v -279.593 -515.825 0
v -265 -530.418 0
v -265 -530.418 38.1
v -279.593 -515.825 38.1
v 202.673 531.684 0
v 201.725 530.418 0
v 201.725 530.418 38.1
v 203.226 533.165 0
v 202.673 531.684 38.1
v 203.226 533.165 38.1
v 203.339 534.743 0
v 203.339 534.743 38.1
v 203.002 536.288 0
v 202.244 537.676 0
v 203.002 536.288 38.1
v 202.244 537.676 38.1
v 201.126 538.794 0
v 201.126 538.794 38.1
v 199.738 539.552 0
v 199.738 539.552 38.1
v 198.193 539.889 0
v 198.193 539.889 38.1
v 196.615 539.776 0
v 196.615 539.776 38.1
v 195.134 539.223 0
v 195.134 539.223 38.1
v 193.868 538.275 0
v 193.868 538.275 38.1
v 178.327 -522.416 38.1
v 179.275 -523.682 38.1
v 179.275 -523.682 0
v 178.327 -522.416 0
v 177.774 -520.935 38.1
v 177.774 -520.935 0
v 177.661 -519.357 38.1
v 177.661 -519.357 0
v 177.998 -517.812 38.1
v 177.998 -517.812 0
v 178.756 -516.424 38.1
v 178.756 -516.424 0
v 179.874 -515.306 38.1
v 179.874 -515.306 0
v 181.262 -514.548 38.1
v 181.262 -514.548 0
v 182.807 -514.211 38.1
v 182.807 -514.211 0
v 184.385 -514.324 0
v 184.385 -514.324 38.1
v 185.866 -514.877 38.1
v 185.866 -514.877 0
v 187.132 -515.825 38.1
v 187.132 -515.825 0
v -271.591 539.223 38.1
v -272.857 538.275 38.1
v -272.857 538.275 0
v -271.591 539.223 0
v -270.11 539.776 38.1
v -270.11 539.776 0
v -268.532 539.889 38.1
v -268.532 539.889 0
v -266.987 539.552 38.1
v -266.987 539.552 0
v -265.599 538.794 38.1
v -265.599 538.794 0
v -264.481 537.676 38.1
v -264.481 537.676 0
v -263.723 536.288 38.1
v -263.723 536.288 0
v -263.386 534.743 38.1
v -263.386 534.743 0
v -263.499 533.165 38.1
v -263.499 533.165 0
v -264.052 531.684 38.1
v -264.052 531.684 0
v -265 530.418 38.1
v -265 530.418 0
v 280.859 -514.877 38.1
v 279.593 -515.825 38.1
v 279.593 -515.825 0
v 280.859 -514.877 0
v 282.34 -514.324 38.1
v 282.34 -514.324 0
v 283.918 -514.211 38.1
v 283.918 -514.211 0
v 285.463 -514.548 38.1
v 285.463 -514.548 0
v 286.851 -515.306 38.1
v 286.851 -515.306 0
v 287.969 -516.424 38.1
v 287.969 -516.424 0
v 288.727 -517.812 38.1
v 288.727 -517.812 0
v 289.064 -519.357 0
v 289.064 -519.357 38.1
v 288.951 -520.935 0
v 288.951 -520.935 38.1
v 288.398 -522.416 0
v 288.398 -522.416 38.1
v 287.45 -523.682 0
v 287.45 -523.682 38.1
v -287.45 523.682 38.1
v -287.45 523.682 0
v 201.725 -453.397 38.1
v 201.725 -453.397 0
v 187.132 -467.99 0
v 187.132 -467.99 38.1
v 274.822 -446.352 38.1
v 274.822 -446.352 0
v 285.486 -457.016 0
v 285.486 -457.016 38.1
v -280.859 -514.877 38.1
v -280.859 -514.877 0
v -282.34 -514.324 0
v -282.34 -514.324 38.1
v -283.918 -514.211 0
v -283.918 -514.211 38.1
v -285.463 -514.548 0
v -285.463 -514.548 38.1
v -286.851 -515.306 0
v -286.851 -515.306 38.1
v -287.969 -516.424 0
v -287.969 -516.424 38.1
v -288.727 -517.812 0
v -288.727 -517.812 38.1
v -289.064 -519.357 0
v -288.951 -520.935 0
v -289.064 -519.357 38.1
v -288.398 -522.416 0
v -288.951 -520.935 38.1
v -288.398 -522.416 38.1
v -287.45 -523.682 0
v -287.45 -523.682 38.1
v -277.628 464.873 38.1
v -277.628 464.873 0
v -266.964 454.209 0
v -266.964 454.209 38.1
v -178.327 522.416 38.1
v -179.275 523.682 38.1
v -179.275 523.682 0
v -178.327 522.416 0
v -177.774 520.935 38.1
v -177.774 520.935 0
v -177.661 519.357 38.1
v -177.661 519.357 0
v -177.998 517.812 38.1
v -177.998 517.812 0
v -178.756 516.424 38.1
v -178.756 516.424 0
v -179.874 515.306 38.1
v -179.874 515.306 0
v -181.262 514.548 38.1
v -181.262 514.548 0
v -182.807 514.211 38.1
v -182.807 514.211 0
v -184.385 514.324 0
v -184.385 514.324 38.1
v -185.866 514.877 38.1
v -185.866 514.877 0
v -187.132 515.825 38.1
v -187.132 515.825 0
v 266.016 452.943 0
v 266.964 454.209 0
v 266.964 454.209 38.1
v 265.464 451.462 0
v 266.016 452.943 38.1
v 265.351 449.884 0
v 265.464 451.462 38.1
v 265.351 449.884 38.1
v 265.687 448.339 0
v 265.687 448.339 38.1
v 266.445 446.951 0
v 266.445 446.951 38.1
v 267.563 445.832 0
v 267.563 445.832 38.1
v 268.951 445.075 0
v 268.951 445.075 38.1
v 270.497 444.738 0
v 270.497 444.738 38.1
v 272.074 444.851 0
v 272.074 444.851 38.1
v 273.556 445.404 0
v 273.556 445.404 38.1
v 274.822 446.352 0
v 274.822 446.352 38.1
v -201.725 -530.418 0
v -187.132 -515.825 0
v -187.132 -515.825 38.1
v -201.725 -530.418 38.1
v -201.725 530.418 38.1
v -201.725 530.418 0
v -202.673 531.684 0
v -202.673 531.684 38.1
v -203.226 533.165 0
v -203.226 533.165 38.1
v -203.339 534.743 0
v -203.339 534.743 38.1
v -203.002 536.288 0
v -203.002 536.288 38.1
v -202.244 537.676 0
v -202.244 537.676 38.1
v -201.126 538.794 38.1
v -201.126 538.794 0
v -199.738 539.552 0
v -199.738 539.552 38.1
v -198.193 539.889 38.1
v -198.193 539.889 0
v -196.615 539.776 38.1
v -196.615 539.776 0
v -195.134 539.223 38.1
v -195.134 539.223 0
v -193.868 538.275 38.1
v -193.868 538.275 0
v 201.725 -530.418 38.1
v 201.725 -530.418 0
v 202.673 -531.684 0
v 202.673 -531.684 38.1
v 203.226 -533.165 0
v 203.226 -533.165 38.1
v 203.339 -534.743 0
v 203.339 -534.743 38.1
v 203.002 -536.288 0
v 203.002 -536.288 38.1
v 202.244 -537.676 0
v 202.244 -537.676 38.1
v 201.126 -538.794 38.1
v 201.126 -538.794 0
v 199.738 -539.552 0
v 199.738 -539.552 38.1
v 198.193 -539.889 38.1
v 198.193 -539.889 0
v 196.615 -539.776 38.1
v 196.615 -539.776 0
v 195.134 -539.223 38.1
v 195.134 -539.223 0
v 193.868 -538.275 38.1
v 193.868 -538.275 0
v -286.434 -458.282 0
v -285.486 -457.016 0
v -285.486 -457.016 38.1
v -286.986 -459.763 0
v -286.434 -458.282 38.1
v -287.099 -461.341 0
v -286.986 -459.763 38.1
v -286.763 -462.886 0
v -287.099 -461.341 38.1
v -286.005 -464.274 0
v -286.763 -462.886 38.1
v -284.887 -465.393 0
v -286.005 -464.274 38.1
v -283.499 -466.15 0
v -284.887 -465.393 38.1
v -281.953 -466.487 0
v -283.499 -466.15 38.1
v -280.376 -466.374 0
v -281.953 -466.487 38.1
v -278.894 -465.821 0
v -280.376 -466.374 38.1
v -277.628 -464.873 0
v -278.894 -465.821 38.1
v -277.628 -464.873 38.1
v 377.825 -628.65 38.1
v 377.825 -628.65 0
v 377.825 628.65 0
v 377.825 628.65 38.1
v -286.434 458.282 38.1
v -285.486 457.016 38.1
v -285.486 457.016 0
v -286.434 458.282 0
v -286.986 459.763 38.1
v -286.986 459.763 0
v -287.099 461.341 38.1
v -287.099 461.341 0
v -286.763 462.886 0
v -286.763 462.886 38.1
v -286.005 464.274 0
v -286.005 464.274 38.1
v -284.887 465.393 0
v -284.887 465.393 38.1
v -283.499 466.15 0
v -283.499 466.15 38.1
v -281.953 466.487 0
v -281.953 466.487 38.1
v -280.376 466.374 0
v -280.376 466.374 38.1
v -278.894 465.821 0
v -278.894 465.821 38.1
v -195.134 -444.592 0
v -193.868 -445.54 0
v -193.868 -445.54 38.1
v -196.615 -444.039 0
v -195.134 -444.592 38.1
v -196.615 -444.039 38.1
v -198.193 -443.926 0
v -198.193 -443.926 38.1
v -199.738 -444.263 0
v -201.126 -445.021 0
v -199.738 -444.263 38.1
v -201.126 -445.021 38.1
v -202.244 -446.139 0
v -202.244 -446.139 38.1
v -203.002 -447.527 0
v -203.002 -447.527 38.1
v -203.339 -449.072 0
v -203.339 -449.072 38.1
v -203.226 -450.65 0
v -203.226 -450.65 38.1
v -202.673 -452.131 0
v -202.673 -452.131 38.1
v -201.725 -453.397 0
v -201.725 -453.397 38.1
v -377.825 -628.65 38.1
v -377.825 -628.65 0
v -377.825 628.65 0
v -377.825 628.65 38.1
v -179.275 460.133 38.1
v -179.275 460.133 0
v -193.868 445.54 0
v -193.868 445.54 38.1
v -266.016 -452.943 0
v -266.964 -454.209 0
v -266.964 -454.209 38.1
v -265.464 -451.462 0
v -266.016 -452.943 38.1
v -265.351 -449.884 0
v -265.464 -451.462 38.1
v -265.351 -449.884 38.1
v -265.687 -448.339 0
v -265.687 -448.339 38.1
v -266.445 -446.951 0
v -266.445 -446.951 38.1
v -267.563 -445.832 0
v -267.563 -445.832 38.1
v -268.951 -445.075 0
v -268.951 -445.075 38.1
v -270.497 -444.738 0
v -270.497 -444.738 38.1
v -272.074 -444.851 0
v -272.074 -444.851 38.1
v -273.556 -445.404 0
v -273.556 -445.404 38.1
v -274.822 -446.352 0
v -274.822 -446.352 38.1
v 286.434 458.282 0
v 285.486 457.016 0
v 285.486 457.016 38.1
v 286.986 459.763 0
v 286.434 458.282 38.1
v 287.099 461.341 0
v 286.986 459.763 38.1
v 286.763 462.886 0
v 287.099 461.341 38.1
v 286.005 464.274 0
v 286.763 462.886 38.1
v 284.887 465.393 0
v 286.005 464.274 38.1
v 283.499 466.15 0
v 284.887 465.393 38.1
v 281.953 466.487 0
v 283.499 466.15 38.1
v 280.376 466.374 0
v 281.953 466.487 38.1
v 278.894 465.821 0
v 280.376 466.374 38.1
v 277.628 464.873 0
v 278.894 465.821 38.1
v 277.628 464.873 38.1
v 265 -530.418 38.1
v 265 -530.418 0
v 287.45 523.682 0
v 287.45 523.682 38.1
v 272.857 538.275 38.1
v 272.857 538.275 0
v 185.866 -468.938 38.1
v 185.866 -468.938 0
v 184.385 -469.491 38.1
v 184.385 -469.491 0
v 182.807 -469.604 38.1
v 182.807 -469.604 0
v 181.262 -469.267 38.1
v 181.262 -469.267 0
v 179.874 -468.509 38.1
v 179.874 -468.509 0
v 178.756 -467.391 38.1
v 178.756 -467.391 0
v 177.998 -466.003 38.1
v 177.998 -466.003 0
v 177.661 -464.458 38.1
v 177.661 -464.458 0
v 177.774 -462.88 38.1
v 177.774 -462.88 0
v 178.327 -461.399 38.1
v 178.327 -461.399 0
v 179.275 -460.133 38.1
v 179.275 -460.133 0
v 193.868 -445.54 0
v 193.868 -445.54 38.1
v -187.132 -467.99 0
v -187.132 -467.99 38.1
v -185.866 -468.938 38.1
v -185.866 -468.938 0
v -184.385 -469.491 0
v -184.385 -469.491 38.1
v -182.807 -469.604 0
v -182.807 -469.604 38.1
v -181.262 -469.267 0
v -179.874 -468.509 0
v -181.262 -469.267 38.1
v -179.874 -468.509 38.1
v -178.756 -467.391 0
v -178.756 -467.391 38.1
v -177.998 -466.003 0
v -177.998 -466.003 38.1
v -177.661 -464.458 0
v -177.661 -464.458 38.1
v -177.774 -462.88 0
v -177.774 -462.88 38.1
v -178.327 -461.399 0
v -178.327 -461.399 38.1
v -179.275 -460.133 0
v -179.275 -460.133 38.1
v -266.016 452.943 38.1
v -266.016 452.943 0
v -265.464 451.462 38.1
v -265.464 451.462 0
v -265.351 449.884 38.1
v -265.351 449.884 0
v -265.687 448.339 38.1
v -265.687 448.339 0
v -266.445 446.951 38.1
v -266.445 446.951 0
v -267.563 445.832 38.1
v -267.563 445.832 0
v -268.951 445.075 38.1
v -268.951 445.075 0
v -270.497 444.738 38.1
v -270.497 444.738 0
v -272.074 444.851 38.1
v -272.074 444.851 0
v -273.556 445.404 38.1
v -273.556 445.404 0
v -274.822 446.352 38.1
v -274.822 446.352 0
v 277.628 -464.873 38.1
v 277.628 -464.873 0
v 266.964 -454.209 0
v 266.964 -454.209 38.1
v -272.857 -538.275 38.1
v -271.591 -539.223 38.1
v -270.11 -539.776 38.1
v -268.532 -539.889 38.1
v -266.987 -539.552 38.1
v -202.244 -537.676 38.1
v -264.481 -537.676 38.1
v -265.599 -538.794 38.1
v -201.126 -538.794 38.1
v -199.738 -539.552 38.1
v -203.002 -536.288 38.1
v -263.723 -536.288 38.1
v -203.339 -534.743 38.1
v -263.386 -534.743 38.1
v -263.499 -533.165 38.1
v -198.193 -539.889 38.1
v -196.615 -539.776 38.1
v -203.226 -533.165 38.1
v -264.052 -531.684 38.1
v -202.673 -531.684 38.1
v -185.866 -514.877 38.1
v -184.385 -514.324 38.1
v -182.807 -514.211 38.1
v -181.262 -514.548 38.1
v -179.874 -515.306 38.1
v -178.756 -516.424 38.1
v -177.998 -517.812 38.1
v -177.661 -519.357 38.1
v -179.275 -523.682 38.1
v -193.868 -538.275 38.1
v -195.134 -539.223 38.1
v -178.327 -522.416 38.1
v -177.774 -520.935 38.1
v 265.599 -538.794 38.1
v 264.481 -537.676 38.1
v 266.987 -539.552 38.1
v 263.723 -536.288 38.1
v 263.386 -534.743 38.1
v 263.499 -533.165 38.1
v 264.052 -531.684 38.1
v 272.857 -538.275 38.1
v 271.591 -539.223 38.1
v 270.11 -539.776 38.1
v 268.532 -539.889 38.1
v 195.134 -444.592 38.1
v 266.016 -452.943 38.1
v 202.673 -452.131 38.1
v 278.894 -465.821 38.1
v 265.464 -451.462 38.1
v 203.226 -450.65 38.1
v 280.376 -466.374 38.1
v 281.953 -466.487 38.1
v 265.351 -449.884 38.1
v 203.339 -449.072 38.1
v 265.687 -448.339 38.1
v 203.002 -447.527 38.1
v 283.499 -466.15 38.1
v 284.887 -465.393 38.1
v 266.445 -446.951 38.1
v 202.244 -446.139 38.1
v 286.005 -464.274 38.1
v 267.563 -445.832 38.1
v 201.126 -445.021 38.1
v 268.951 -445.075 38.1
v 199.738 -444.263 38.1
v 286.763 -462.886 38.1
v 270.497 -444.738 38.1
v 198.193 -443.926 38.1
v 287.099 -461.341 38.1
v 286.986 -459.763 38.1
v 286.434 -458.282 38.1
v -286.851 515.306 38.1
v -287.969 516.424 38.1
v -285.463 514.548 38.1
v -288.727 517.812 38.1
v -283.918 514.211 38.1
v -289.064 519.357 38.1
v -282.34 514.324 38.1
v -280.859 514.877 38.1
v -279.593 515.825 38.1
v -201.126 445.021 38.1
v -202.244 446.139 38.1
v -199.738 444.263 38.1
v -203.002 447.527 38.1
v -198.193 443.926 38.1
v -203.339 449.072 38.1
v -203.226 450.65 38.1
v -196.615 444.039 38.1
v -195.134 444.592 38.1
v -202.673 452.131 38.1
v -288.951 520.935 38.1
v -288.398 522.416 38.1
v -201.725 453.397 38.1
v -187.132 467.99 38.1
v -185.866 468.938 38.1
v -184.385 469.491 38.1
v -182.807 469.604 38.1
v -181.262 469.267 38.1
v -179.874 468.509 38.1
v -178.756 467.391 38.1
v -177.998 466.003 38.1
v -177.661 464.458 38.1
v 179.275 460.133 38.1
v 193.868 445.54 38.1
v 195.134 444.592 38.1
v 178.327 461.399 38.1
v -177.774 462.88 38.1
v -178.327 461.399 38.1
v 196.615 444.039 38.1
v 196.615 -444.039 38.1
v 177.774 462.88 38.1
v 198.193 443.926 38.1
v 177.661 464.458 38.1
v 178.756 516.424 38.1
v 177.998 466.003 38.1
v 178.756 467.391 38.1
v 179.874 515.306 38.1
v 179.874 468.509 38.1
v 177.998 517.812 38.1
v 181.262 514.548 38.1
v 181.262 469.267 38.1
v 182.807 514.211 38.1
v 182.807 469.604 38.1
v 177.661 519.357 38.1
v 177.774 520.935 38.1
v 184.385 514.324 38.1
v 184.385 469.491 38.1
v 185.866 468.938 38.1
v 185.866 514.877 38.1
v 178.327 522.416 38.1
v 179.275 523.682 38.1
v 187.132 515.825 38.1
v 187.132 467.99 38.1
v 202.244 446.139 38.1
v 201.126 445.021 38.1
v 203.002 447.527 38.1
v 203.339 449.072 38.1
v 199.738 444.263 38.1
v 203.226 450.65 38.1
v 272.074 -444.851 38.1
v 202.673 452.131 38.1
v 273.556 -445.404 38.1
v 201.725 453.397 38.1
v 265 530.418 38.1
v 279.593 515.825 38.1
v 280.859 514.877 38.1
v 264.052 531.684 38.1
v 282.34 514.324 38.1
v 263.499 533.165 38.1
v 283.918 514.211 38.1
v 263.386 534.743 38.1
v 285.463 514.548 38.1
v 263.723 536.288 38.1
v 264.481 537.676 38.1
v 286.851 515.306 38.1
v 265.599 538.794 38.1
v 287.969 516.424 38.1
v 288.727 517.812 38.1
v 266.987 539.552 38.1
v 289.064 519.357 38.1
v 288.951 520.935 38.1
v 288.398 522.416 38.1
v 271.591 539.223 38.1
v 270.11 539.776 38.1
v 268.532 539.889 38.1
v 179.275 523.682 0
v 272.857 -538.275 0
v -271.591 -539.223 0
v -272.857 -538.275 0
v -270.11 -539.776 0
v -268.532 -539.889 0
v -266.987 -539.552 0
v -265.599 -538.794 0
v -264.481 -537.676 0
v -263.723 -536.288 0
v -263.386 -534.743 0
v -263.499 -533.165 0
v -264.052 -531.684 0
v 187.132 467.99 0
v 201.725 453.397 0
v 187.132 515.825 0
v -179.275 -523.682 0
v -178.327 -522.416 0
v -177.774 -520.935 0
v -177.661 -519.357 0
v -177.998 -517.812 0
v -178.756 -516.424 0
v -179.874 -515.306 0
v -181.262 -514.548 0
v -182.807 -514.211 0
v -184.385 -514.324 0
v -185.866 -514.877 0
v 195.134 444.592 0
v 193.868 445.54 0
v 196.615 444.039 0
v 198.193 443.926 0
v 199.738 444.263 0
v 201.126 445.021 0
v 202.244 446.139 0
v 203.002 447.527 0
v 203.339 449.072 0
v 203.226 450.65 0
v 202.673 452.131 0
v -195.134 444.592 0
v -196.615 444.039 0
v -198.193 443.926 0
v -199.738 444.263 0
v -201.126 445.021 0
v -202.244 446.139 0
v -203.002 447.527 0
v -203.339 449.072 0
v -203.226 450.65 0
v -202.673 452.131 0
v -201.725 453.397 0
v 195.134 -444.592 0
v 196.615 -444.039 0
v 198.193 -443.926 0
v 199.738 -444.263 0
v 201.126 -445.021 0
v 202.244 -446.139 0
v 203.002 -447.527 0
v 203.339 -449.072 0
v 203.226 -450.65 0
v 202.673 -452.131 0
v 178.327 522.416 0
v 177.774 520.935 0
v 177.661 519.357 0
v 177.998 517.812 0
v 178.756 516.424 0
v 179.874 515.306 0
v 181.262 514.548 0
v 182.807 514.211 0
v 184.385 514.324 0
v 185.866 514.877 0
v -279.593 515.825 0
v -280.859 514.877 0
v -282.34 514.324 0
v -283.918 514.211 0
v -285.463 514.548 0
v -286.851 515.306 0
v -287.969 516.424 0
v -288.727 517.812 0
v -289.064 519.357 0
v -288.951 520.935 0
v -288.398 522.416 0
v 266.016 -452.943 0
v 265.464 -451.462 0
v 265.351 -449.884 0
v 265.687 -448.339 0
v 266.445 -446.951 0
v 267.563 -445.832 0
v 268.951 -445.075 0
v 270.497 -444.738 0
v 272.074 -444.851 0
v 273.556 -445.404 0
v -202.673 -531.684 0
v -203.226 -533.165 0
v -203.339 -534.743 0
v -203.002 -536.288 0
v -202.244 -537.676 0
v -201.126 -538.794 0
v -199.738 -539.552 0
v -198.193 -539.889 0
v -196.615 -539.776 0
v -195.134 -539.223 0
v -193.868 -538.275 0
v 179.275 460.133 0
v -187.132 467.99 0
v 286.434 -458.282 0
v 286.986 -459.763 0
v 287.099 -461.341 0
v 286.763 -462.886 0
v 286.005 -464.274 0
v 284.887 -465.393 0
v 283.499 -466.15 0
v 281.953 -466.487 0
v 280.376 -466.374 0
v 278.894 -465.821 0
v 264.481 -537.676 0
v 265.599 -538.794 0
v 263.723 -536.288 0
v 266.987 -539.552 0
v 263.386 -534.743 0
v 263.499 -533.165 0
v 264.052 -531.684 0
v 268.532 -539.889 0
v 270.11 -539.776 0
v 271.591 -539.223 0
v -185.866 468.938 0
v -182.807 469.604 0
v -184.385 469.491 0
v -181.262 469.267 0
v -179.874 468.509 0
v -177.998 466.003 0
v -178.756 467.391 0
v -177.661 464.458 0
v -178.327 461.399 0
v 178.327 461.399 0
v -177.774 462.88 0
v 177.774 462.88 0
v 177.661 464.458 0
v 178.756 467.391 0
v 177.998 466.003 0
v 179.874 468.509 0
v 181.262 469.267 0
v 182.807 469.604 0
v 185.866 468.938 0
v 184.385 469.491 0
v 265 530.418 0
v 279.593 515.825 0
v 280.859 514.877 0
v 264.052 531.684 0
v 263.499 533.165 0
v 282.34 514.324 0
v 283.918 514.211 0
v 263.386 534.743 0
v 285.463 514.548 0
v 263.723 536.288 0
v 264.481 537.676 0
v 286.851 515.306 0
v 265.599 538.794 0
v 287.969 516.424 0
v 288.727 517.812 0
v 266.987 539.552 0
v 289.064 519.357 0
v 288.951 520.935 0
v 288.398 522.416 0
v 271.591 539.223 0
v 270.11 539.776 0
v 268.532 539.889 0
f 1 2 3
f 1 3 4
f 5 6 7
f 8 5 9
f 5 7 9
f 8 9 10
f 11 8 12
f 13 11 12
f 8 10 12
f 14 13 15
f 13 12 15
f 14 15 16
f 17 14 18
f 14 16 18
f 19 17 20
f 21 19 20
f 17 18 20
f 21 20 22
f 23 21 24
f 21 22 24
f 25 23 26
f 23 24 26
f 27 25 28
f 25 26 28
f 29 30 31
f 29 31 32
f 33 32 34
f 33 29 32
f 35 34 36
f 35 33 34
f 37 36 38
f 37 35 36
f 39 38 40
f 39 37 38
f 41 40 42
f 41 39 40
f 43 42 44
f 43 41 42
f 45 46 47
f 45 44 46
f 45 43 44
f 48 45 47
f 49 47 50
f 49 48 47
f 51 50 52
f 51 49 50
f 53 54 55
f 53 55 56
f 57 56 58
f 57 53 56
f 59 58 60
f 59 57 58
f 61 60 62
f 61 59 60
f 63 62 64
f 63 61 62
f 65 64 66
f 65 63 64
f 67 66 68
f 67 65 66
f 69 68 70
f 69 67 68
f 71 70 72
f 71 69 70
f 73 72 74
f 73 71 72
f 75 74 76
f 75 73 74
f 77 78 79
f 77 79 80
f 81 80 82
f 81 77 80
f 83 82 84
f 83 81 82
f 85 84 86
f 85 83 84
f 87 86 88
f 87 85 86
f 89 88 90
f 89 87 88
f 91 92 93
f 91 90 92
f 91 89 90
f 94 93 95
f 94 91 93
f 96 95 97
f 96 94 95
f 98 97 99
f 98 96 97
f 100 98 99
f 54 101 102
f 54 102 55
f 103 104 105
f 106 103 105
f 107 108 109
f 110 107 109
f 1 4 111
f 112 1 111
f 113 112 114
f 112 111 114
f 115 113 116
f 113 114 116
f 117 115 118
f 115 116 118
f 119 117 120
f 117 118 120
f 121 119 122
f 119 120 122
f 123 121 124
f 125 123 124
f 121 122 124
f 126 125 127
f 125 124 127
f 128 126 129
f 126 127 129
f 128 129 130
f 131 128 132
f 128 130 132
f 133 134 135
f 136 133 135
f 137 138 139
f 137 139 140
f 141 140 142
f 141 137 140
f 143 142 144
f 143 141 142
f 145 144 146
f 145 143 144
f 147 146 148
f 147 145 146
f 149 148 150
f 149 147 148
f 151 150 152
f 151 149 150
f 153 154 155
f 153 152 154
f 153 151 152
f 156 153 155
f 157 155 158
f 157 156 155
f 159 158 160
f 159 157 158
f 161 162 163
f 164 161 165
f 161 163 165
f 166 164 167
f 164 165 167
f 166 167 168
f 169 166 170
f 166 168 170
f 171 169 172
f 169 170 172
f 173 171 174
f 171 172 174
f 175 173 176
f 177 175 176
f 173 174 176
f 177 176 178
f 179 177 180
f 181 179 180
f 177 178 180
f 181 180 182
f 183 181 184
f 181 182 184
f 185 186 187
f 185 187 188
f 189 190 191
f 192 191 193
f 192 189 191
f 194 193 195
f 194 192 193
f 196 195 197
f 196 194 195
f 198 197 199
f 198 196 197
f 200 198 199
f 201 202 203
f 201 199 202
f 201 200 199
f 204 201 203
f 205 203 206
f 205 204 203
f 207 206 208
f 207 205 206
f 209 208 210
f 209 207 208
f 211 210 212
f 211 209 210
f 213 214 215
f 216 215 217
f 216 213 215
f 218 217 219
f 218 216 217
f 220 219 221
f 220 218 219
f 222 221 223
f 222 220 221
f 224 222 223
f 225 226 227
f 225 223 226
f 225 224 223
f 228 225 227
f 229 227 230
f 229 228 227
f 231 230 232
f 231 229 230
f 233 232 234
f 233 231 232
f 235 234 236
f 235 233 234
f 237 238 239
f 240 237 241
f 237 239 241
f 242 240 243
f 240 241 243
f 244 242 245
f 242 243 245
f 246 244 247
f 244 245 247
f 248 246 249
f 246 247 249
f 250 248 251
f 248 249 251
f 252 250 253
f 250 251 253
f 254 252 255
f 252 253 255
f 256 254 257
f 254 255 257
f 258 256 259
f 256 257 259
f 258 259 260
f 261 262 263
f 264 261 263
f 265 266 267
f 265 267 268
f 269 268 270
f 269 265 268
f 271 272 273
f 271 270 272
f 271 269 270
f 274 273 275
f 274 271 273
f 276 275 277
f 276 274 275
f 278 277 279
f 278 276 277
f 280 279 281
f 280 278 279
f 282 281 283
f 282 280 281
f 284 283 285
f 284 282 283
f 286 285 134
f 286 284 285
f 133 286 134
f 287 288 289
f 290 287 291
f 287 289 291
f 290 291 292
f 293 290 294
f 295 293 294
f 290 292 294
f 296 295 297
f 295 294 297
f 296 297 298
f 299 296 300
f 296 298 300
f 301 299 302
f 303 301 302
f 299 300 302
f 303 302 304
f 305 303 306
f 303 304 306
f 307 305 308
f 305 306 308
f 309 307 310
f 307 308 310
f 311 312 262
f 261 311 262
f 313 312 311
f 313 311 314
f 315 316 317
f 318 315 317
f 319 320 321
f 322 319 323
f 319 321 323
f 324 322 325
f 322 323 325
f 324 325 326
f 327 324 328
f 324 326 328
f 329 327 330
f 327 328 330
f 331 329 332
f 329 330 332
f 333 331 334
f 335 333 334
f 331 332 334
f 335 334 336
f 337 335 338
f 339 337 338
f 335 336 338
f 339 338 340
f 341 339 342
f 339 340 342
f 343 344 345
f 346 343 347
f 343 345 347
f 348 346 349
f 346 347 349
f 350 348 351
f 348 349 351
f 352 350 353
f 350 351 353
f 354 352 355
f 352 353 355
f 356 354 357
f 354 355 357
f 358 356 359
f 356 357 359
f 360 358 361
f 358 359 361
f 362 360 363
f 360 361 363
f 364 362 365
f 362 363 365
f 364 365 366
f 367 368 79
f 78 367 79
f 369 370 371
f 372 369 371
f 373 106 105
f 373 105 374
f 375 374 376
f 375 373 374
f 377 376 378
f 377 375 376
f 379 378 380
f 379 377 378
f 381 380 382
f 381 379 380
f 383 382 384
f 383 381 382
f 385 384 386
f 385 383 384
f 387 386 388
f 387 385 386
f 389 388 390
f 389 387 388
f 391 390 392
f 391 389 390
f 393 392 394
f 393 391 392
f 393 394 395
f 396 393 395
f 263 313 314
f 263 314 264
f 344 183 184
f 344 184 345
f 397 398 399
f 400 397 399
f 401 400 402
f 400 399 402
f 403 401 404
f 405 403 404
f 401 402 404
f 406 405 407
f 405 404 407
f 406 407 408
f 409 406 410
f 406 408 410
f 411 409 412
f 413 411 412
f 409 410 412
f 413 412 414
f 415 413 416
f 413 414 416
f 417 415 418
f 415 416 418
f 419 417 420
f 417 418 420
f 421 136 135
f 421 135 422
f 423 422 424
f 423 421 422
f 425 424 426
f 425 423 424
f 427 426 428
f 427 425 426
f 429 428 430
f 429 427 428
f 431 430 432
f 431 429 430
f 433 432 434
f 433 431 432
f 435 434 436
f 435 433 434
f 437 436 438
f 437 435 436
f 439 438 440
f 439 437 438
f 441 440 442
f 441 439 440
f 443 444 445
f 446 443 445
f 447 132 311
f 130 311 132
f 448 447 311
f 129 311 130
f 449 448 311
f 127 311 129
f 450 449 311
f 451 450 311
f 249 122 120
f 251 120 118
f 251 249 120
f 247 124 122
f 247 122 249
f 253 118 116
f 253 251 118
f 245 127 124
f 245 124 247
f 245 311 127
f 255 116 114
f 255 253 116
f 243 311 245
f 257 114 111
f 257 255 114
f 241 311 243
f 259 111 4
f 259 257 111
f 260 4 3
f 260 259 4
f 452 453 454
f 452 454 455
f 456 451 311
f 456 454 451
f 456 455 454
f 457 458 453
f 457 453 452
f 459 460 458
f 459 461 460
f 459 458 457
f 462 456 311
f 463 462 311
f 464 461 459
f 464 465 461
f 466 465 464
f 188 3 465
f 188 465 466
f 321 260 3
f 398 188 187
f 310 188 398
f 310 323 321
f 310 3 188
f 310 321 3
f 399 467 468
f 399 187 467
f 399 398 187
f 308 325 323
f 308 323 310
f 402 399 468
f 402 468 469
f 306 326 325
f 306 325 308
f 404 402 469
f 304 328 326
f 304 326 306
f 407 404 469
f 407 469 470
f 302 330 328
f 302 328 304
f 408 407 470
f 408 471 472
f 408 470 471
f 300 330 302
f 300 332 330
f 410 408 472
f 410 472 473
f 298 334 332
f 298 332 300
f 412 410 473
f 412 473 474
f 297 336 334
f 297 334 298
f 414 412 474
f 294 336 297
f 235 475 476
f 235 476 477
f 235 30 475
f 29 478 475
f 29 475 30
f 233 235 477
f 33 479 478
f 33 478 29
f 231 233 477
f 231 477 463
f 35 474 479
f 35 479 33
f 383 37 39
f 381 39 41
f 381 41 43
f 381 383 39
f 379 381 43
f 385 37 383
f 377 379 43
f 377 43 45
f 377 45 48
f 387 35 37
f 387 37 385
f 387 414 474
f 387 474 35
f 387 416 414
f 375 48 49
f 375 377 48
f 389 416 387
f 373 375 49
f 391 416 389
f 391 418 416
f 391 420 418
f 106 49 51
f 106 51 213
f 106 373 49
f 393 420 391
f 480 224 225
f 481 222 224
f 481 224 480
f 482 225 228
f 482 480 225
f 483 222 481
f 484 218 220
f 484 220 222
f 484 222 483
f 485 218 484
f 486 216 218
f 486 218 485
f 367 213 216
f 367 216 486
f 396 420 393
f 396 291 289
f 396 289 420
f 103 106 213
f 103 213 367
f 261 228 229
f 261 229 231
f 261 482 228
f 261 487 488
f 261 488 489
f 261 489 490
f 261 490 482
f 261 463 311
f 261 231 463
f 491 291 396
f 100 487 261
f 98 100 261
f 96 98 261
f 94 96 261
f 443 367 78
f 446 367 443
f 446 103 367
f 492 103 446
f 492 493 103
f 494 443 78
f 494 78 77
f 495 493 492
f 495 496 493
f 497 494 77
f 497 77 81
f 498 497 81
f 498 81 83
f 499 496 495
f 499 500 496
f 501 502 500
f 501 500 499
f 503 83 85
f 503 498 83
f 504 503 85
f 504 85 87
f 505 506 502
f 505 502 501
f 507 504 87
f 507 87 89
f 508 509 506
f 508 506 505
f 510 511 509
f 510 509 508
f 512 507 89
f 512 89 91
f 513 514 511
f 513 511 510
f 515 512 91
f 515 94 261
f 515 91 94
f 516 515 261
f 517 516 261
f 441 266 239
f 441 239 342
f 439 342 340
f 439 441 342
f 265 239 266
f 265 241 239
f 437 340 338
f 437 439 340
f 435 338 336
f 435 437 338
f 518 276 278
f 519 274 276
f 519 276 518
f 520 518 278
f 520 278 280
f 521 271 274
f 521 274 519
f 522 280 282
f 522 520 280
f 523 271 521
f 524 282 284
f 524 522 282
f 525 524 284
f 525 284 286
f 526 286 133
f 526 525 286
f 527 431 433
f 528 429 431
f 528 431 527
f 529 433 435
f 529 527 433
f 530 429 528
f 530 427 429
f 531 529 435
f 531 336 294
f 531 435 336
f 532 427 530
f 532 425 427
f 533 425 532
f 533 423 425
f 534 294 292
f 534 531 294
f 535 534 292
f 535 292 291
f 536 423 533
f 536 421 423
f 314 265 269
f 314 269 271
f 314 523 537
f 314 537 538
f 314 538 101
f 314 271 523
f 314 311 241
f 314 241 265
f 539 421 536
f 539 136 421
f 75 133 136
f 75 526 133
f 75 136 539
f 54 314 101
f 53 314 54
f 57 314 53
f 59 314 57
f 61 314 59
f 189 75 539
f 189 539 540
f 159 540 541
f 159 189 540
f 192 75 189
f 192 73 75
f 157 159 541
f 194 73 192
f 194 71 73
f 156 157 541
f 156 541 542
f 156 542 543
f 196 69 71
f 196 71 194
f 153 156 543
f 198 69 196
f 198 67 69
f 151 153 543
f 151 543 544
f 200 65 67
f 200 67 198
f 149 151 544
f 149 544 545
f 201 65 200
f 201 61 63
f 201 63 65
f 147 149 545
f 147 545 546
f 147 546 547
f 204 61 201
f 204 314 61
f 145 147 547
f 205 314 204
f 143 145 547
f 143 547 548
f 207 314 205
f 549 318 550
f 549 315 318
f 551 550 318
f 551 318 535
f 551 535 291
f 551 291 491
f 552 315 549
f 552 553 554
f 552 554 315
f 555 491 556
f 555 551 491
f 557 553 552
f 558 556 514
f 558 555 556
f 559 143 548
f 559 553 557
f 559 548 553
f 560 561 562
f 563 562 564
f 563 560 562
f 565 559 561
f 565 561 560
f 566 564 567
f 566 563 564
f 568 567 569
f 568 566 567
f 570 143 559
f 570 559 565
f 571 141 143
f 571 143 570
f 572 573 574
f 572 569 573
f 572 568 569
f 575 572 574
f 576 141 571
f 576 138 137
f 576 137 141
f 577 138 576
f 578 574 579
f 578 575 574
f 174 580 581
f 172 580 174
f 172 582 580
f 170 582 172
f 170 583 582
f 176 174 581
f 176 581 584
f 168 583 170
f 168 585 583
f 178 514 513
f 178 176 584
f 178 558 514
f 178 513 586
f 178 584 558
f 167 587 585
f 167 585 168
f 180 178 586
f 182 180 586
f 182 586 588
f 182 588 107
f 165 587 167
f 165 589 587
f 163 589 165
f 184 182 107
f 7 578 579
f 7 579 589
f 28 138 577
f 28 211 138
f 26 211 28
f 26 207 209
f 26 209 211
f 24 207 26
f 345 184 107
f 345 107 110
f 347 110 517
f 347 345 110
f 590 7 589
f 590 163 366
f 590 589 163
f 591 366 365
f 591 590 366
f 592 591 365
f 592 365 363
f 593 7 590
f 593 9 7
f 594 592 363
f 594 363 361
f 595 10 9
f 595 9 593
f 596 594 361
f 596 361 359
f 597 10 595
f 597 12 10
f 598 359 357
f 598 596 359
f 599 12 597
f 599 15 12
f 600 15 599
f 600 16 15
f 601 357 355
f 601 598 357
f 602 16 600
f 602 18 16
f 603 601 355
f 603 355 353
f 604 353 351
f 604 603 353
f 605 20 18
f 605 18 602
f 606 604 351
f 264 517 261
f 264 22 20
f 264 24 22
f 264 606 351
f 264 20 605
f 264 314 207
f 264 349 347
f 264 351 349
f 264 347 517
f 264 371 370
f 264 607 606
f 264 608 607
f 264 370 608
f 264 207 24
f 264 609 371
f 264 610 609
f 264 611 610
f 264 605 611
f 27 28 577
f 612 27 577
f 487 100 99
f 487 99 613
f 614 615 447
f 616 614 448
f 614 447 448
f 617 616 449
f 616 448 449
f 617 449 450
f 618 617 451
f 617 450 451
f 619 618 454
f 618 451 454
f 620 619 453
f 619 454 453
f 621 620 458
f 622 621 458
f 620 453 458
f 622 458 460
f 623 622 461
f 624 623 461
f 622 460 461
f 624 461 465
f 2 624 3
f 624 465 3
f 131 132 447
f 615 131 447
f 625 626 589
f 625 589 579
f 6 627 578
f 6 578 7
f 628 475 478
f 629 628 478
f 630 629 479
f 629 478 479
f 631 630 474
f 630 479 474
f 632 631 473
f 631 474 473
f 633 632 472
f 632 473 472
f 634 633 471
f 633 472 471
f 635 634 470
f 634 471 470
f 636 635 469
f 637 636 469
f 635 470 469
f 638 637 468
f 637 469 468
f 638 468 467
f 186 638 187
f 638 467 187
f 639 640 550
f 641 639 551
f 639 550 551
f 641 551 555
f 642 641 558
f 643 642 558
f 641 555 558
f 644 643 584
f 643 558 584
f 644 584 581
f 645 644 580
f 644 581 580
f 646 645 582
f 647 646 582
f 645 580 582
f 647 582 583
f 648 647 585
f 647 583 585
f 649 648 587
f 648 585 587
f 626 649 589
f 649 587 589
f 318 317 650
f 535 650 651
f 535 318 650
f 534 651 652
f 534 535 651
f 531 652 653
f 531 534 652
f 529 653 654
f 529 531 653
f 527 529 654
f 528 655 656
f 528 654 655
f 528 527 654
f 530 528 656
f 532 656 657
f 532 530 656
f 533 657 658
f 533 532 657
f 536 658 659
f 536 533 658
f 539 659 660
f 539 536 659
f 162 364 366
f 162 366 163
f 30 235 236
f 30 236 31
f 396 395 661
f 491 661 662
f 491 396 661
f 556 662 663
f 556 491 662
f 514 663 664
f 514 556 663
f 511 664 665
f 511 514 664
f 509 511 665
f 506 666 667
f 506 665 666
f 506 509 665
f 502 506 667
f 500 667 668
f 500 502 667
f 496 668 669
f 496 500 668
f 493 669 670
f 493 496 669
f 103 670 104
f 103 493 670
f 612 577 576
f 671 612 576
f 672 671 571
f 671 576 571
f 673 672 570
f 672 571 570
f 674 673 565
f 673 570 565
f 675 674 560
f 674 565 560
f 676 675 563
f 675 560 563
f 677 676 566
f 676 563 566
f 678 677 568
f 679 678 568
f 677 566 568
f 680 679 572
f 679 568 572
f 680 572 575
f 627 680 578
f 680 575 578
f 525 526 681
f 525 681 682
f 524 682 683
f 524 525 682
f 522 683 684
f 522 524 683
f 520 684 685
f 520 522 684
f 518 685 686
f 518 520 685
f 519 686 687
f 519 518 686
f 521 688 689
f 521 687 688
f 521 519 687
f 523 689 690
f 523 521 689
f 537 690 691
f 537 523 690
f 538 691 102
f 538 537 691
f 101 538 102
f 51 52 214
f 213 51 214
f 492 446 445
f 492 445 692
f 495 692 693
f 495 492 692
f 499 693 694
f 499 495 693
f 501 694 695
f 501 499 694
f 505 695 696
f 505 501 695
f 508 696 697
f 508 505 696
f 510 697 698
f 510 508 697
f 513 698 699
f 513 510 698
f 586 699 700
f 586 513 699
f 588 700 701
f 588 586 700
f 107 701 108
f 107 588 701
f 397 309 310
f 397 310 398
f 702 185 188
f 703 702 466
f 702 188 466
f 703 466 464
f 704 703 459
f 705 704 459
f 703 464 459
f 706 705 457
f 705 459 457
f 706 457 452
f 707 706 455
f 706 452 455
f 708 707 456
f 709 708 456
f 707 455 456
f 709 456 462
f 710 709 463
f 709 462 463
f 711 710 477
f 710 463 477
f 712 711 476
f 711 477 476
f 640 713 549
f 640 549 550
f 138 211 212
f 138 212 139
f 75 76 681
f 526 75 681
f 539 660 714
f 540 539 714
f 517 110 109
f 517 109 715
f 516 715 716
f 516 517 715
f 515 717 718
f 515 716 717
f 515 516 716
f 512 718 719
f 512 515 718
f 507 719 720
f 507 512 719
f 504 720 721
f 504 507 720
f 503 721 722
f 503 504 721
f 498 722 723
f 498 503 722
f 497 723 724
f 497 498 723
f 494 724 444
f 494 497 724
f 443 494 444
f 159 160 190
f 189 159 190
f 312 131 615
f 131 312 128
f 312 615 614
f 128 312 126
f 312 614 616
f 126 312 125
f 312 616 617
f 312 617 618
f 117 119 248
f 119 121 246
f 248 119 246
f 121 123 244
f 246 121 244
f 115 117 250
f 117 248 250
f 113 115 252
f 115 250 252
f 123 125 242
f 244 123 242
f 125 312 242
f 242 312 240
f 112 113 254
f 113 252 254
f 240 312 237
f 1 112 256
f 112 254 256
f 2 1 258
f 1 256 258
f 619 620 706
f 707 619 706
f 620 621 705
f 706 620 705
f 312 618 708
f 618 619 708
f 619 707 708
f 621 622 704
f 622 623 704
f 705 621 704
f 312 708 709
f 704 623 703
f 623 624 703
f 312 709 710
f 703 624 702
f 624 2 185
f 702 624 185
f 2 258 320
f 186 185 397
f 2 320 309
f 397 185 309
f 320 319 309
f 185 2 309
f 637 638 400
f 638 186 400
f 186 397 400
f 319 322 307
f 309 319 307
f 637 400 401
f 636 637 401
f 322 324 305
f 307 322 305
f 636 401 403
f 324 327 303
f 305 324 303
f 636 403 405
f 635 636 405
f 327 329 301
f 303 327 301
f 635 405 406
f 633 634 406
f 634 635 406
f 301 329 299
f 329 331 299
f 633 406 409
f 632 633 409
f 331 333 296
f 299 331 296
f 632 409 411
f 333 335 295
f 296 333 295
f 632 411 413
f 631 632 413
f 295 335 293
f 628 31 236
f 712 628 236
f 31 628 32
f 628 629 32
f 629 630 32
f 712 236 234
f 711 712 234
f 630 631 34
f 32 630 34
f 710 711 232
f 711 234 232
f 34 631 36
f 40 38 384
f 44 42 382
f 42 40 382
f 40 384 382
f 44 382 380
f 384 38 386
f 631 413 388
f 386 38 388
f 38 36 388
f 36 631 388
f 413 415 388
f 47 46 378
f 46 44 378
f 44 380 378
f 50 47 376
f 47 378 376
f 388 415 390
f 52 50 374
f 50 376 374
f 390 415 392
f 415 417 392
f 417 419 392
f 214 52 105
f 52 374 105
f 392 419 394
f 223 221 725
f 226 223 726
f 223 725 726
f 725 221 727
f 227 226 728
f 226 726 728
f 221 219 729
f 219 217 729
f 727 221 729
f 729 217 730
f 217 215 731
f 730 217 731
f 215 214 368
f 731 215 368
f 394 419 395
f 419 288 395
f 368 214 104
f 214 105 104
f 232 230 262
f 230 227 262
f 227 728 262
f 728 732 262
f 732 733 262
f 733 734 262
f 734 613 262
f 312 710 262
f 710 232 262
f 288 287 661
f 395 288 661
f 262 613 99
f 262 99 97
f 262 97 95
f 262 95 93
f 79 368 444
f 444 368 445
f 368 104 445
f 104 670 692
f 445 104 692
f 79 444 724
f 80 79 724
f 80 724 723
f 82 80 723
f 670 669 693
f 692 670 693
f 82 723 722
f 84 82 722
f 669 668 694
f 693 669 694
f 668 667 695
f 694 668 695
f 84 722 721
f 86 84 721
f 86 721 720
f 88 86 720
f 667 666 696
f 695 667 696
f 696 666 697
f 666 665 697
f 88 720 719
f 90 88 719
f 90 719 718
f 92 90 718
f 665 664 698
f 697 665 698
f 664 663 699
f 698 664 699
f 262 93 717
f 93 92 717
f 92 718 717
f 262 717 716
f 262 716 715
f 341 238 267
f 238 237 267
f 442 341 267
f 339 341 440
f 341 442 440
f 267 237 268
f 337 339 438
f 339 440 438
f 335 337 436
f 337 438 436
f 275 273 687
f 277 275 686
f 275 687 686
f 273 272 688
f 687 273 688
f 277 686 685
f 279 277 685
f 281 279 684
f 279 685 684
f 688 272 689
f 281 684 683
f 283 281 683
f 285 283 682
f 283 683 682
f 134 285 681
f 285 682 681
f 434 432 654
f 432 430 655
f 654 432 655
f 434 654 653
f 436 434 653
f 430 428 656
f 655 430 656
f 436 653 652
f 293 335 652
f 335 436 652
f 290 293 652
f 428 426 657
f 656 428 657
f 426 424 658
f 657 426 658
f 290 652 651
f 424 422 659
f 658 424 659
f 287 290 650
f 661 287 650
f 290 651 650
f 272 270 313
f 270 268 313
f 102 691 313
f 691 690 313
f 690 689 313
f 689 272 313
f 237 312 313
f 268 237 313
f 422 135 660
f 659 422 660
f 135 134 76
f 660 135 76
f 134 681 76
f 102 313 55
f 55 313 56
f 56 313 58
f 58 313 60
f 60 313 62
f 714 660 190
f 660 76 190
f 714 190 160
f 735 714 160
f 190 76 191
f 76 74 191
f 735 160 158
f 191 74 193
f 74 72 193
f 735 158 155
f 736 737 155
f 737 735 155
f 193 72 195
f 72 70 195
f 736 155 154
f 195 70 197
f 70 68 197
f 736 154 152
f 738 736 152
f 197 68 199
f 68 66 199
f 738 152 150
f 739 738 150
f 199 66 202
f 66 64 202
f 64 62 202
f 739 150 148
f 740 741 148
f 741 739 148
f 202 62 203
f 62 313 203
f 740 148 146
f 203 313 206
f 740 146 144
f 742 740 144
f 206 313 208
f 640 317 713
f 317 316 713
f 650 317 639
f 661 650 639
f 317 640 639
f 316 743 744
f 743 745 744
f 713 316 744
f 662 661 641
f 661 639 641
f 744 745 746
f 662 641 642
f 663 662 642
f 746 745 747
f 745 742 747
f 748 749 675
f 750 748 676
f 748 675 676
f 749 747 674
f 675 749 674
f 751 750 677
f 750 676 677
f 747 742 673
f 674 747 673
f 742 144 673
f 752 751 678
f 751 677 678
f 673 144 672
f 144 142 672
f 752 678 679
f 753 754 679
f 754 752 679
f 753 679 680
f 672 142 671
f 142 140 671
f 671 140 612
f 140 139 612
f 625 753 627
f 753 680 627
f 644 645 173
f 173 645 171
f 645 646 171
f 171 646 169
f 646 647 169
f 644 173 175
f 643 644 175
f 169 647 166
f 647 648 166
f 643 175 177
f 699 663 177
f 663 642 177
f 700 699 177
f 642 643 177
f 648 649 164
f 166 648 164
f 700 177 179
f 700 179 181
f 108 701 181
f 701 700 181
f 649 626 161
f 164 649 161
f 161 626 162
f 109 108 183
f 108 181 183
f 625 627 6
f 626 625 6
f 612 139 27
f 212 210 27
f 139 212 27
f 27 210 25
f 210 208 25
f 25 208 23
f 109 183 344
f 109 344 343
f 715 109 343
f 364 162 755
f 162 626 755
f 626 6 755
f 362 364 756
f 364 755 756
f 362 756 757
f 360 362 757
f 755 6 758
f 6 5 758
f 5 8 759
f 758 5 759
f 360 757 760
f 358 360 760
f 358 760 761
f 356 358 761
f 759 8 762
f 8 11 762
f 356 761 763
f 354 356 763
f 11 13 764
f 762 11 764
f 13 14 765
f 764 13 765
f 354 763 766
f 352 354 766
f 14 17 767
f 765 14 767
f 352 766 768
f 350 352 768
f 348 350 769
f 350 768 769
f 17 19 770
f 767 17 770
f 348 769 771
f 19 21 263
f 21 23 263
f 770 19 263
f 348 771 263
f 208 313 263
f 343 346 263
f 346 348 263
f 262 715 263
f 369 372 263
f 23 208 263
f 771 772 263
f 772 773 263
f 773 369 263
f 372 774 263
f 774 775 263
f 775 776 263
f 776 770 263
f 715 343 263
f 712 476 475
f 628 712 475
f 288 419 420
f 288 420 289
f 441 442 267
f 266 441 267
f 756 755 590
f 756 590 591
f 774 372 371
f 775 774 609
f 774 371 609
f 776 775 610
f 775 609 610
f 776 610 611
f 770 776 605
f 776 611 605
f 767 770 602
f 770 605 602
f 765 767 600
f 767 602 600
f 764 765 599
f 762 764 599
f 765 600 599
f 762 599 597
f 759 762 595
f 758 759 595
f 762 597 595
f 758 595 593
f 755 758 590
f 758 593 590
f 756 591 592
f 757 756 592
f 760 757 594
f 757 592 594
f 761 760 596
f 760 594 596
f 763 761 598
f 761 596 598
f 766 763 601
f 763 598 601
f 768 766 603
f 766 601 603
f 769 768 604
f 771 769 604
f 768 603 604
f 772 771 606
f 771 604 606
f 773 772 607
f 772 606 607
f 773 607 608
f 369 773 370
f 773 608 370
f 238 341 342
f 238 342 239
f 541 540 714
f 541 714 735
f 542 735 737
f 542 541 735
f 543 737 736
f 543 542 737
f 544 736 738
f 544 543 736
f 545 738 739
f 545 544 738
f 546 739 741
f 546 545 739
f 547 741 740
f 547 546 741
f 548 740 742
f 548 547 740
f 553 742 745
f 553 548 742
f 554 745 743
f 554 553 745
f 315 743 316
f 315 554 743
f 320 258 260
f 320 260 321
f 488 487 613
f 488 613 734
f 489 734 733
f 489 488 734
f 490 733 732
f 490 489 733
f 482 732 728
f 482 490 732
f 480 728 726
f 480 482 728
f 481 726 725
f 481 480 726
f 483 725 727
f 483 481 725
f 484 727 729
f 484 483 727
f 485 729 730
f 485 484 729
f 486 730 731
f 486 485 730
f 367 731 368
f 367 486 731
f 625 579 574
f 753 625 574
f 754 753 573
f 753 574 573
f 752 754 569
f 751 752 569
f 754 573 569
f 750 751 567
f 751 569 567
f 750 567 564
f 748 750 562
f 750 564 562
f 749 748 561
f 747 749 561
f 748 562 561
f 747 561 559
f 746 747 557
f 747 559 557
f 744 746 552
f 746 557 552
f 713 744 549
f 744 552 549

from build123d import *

# Parameters (mm, degrees)
SKETCH1_W           = 755.65
SKETCH1_H           = 1257.3
BOSS_EXTRUDE1_DEPTH = 38.1
CUT_EXTRUDE3_DEPTH  = 735.441395296


with BuildPart() as part:
    # Sketch1 → Boss-Extrude1 (new body)
    with BuildSketch(Plane.XY):
        Rectangle(SKETCH1_W, SKETCH1_H)
    extrude(amount=BOSS_EXTRUDE1_DEPTH)

    # Sketch6 → Cut-Extrude3 (cut, through all)
    with BuildSketch(Plane.XY.offset(38.1)):
        with BuildLine():
            Line((287.450320151, -523.682403955), (272.857403955, -538.275320151))
            ThreePointArc((272.857403955, -538.275320151), (264.999679849, -538.275320151), (264.999679849, -530.417596045))
            Line((264.999679849, -530.417596045), (279.592596045, -515.824679849))
            ThreePointArc((279.592596045, -515.824679849), (287.450320151, -515.824679849), (287.450320151, -523.682403955))
        make_face()
        with BuildLine():
            Line((-287.450320151, -523.682403955), (-272.857403955, -538.275320151))
            ThreePointArc((-272.857403955, -538.275320151), (-264.999679849, -538.275320151), (-264.999679849, -530.417596045))
            Line((-264.999679849, -530.417596045), (-279.592596045, -515.824679849))
            ThreePointArc((-279.592596045, -515.824679849), (-287.450320151, -515.824679849), (-287.450320151, -523.682403955))
        make_face()
        with BuildLine():
            Line((-193.867596045, -538.275320151), (-179.274679849, -523.682403955))
            ThreePointArc((-179.274679849, -523.682403955), (-179.274679849, -515.824679849), (-187.132403955, -515.824679849))
            Line((-187.132403955, -515.824679849), (-201.725320151, -530.417596045))
            ThreePointArc((-201.725320151, -530.417596045), (-201.725320151, -538.275320151), (-193.867596045, -538.275320151))
        make_face()
        with BuildLine():
            Line((-274.821834981, -446.351610875), (-285.485889125, -457.015665019))
            ThreePointArc((-285.485889125, -457.015665019), (-285.485889125, -464.873389125), (-277.628165019, -464.873389125))
            Line((-277.628165019, -464.873389125), (-266.964110875, -454.209334981))
            ThreePointArc((-266.964110875, -454.209334981), (-266.964110875, -446.351610875), (-274.821834981, -446.351610875))
        make_face()
        with BuildLine():
            Line((193.867596045, -538.275320151), (179.274679849, -523.682403955))
            ThreePointArc((179.274679849, -523.682403955), (179.274679849, -515.824679849), (187.132403955, -515.824679849))
            Line((187.132403955, -515.824679849), (201.725320151, -530.417596045))
            ThreePointArc((201.725320151, -530.417596045), (201.725320151, -538.275320151), (193.867596045, -538.275320151))
        make_face()
        with BuildLine():
            Line((274.821834981, -446.351610875), (285.485889125, -457.015665019))
            ThreePointArc((285.485889125, -457.015665019), (285.485889125, -464.873389125), (277.628165019, -464.873389125))
            Line((277.628165019, -464.873389125), (266.964110875, -454.209334981))
            ThreePointArc((266.964110875, -454.209334981), (266.964110875, -446.351610875), (274.821834981, -446.351610875))
        make_face()
        with BuildLine():
            Line((201.725320151, -453.397436213), (187.132403955, -467.99035241))
            ThreePointArc((187.132403955, -467.99035241), (179.274679849, -467.99035241), (179.274679849, -460.132628304))
            Line((179.274679849, -460.132628304), (193.867596045, -445.539712107))
            ThreePointArc((193.867596045, -445.539712107), (201.725320151, -445.539712107), (201.725320151, -453.397436213))
        make_face()
        with BuildLine():
            Line((-201.725320151, -453.397436213), (-187.132403955, -467.99035241))
            ThreePointArc((-187.132403955, -467.99035241), (-179.274679849, -467.99035241), (-179.274679849, -460.132628304))
            Line((-179.274679849, -460.132628304), (-193.867596045, -445.539712107))
            ThreePointArc((-193.867596045, -445.539712107), (-201.725320151, -445.539712107), (-201.725320151, -453.397436213))
        make_face()
        with BuildLine():
            Line((287.450320151, 523.682403955), (272.857403955, 538.275320151))
            ThreePointArc((272.857403955, 538.275320151), (264.999679849, 538.275320151), (264.999679849, 530.417596045))
            Line((264.999679849, 530.417596045), (279.592596045, 515.824679849))
            ThreePointArc((279.592596045, 515.824679849), (287.450320151, 515.824679849), (287.450320151, 523.682403955))
        make_face()
        with BuildLine():
            Line((193.867596045, 538.275320151), (179.274679849, 523.682403955))
            ThreePointArc((179.274679849, 523.682403955), (179.274679849, 515.824679849), (187.132403955, 515.824679849))
            Line((187.132403955, 515.824679849), (201.725320151, 530.417596045))
            ThreePointArc((201.725320151, 530.417596045), (201.725320151, 538.275320151), (193.867596045, 538.275320151))
        make_face()
        with BuildLine():
            Line((-287.450320151, 523.682403955), (-272.857403955, 538.275320151))
            ThreePointArc((-272.857403955, 538.275320151), (-264.999679849, 538.275320151), (-264.999679849, 530.417596045))
            Line((-264.999679849, 530.417596045), (-279.592596045, 515.824679849))
            ThreePointArc((-279.592596045, 515.824679849), (-287.450320151, 515.824679849), (-287.450320151, 523.682403955))
        make_face()
        with BuildLine():
            Line((-193.867596045, 538.275320151), (-179.274679849, 523.682403955))
            ThreePointArc((-179.274679849, 523.682403955), (-179.274679849, 515.824679849), (-187.132403955, 515.824679849))
            Line((-187.132403955, 515.824679849), (-201.725320151, 530.417596045))
            ThreePointArc((-201.725320151, 530.417596045), (-201.725320151, 538.275320151), (-193.867596045, 538.275320151))
        make_face()
        with BuildLine():
            Line((-274.821834981, 446.351610875), (-285.485889125, 457.015665019))
            ThreePointArc((-285.485889125, 457.015665019), (-285.485889125, 464.873389125), (-277.628165019, 464.873389125))
            Line((-277.628165019, 464.873389125), (-266.964110875, 454.209334981))
            ThreePointArc((-266.964110875, 454.209334981), (-266.964110875, 446.351610875), (-274.821834981, 446.351610875))
        make_face()
        with BuildLine():
            Line((274.821834981, 446.351610875), (285.485889125, 457.015665019))
            ThreePointArc((285.485889125, 457.015665019), (285.485889125, 464.873389125), (277.628165019, 464.873389125))
            Line((277.628165019, 464.873389125), (266.964110875, 454.209334981))
            ThreePointArc((266.964110875, 454.209334981), (266.964110875, 446.351610875), (274.821834981, 446.351610875))
        make_face()
        with BuildLine():
            Line((201.725320151, 453.397436213), (187.132403955, 467.99035241))
            ThreePointArc((187.132403955, 467.99035241), (179.274679849, 467.99035241), (179.274679849, 460.132628304))
            Line((179.274679849, 460.132628304), (193.867596045, 445.539712107))
            ThreePointArc((193.867596045, 445.539712107), (201.725320151, 445.539712107), (201.725320151, 453.397436213))
        make_face()
        with BuildLine():
            Line((-201.725320151, 453.397436213), (-187.132403955, 467.99035241))
            ThreePointArc((-187.132403955, 467.99035241), (-179.274679849, 467.99035241), (-179.274679849, 460.132628304))
            Line((-179.274679849, 460.132628304), (-193.867596045, 445.539712107))
            ThreePointArc((-193.867596045, 445.539712107), (-201.725320151, 445.539712107), (-201.725320151, 453.397436213))
        make_face()
    extrude(amount=-CUT_EXTRUDE3_DEPTH, mode=Mode.SUBTRACT)


solid = part.part
